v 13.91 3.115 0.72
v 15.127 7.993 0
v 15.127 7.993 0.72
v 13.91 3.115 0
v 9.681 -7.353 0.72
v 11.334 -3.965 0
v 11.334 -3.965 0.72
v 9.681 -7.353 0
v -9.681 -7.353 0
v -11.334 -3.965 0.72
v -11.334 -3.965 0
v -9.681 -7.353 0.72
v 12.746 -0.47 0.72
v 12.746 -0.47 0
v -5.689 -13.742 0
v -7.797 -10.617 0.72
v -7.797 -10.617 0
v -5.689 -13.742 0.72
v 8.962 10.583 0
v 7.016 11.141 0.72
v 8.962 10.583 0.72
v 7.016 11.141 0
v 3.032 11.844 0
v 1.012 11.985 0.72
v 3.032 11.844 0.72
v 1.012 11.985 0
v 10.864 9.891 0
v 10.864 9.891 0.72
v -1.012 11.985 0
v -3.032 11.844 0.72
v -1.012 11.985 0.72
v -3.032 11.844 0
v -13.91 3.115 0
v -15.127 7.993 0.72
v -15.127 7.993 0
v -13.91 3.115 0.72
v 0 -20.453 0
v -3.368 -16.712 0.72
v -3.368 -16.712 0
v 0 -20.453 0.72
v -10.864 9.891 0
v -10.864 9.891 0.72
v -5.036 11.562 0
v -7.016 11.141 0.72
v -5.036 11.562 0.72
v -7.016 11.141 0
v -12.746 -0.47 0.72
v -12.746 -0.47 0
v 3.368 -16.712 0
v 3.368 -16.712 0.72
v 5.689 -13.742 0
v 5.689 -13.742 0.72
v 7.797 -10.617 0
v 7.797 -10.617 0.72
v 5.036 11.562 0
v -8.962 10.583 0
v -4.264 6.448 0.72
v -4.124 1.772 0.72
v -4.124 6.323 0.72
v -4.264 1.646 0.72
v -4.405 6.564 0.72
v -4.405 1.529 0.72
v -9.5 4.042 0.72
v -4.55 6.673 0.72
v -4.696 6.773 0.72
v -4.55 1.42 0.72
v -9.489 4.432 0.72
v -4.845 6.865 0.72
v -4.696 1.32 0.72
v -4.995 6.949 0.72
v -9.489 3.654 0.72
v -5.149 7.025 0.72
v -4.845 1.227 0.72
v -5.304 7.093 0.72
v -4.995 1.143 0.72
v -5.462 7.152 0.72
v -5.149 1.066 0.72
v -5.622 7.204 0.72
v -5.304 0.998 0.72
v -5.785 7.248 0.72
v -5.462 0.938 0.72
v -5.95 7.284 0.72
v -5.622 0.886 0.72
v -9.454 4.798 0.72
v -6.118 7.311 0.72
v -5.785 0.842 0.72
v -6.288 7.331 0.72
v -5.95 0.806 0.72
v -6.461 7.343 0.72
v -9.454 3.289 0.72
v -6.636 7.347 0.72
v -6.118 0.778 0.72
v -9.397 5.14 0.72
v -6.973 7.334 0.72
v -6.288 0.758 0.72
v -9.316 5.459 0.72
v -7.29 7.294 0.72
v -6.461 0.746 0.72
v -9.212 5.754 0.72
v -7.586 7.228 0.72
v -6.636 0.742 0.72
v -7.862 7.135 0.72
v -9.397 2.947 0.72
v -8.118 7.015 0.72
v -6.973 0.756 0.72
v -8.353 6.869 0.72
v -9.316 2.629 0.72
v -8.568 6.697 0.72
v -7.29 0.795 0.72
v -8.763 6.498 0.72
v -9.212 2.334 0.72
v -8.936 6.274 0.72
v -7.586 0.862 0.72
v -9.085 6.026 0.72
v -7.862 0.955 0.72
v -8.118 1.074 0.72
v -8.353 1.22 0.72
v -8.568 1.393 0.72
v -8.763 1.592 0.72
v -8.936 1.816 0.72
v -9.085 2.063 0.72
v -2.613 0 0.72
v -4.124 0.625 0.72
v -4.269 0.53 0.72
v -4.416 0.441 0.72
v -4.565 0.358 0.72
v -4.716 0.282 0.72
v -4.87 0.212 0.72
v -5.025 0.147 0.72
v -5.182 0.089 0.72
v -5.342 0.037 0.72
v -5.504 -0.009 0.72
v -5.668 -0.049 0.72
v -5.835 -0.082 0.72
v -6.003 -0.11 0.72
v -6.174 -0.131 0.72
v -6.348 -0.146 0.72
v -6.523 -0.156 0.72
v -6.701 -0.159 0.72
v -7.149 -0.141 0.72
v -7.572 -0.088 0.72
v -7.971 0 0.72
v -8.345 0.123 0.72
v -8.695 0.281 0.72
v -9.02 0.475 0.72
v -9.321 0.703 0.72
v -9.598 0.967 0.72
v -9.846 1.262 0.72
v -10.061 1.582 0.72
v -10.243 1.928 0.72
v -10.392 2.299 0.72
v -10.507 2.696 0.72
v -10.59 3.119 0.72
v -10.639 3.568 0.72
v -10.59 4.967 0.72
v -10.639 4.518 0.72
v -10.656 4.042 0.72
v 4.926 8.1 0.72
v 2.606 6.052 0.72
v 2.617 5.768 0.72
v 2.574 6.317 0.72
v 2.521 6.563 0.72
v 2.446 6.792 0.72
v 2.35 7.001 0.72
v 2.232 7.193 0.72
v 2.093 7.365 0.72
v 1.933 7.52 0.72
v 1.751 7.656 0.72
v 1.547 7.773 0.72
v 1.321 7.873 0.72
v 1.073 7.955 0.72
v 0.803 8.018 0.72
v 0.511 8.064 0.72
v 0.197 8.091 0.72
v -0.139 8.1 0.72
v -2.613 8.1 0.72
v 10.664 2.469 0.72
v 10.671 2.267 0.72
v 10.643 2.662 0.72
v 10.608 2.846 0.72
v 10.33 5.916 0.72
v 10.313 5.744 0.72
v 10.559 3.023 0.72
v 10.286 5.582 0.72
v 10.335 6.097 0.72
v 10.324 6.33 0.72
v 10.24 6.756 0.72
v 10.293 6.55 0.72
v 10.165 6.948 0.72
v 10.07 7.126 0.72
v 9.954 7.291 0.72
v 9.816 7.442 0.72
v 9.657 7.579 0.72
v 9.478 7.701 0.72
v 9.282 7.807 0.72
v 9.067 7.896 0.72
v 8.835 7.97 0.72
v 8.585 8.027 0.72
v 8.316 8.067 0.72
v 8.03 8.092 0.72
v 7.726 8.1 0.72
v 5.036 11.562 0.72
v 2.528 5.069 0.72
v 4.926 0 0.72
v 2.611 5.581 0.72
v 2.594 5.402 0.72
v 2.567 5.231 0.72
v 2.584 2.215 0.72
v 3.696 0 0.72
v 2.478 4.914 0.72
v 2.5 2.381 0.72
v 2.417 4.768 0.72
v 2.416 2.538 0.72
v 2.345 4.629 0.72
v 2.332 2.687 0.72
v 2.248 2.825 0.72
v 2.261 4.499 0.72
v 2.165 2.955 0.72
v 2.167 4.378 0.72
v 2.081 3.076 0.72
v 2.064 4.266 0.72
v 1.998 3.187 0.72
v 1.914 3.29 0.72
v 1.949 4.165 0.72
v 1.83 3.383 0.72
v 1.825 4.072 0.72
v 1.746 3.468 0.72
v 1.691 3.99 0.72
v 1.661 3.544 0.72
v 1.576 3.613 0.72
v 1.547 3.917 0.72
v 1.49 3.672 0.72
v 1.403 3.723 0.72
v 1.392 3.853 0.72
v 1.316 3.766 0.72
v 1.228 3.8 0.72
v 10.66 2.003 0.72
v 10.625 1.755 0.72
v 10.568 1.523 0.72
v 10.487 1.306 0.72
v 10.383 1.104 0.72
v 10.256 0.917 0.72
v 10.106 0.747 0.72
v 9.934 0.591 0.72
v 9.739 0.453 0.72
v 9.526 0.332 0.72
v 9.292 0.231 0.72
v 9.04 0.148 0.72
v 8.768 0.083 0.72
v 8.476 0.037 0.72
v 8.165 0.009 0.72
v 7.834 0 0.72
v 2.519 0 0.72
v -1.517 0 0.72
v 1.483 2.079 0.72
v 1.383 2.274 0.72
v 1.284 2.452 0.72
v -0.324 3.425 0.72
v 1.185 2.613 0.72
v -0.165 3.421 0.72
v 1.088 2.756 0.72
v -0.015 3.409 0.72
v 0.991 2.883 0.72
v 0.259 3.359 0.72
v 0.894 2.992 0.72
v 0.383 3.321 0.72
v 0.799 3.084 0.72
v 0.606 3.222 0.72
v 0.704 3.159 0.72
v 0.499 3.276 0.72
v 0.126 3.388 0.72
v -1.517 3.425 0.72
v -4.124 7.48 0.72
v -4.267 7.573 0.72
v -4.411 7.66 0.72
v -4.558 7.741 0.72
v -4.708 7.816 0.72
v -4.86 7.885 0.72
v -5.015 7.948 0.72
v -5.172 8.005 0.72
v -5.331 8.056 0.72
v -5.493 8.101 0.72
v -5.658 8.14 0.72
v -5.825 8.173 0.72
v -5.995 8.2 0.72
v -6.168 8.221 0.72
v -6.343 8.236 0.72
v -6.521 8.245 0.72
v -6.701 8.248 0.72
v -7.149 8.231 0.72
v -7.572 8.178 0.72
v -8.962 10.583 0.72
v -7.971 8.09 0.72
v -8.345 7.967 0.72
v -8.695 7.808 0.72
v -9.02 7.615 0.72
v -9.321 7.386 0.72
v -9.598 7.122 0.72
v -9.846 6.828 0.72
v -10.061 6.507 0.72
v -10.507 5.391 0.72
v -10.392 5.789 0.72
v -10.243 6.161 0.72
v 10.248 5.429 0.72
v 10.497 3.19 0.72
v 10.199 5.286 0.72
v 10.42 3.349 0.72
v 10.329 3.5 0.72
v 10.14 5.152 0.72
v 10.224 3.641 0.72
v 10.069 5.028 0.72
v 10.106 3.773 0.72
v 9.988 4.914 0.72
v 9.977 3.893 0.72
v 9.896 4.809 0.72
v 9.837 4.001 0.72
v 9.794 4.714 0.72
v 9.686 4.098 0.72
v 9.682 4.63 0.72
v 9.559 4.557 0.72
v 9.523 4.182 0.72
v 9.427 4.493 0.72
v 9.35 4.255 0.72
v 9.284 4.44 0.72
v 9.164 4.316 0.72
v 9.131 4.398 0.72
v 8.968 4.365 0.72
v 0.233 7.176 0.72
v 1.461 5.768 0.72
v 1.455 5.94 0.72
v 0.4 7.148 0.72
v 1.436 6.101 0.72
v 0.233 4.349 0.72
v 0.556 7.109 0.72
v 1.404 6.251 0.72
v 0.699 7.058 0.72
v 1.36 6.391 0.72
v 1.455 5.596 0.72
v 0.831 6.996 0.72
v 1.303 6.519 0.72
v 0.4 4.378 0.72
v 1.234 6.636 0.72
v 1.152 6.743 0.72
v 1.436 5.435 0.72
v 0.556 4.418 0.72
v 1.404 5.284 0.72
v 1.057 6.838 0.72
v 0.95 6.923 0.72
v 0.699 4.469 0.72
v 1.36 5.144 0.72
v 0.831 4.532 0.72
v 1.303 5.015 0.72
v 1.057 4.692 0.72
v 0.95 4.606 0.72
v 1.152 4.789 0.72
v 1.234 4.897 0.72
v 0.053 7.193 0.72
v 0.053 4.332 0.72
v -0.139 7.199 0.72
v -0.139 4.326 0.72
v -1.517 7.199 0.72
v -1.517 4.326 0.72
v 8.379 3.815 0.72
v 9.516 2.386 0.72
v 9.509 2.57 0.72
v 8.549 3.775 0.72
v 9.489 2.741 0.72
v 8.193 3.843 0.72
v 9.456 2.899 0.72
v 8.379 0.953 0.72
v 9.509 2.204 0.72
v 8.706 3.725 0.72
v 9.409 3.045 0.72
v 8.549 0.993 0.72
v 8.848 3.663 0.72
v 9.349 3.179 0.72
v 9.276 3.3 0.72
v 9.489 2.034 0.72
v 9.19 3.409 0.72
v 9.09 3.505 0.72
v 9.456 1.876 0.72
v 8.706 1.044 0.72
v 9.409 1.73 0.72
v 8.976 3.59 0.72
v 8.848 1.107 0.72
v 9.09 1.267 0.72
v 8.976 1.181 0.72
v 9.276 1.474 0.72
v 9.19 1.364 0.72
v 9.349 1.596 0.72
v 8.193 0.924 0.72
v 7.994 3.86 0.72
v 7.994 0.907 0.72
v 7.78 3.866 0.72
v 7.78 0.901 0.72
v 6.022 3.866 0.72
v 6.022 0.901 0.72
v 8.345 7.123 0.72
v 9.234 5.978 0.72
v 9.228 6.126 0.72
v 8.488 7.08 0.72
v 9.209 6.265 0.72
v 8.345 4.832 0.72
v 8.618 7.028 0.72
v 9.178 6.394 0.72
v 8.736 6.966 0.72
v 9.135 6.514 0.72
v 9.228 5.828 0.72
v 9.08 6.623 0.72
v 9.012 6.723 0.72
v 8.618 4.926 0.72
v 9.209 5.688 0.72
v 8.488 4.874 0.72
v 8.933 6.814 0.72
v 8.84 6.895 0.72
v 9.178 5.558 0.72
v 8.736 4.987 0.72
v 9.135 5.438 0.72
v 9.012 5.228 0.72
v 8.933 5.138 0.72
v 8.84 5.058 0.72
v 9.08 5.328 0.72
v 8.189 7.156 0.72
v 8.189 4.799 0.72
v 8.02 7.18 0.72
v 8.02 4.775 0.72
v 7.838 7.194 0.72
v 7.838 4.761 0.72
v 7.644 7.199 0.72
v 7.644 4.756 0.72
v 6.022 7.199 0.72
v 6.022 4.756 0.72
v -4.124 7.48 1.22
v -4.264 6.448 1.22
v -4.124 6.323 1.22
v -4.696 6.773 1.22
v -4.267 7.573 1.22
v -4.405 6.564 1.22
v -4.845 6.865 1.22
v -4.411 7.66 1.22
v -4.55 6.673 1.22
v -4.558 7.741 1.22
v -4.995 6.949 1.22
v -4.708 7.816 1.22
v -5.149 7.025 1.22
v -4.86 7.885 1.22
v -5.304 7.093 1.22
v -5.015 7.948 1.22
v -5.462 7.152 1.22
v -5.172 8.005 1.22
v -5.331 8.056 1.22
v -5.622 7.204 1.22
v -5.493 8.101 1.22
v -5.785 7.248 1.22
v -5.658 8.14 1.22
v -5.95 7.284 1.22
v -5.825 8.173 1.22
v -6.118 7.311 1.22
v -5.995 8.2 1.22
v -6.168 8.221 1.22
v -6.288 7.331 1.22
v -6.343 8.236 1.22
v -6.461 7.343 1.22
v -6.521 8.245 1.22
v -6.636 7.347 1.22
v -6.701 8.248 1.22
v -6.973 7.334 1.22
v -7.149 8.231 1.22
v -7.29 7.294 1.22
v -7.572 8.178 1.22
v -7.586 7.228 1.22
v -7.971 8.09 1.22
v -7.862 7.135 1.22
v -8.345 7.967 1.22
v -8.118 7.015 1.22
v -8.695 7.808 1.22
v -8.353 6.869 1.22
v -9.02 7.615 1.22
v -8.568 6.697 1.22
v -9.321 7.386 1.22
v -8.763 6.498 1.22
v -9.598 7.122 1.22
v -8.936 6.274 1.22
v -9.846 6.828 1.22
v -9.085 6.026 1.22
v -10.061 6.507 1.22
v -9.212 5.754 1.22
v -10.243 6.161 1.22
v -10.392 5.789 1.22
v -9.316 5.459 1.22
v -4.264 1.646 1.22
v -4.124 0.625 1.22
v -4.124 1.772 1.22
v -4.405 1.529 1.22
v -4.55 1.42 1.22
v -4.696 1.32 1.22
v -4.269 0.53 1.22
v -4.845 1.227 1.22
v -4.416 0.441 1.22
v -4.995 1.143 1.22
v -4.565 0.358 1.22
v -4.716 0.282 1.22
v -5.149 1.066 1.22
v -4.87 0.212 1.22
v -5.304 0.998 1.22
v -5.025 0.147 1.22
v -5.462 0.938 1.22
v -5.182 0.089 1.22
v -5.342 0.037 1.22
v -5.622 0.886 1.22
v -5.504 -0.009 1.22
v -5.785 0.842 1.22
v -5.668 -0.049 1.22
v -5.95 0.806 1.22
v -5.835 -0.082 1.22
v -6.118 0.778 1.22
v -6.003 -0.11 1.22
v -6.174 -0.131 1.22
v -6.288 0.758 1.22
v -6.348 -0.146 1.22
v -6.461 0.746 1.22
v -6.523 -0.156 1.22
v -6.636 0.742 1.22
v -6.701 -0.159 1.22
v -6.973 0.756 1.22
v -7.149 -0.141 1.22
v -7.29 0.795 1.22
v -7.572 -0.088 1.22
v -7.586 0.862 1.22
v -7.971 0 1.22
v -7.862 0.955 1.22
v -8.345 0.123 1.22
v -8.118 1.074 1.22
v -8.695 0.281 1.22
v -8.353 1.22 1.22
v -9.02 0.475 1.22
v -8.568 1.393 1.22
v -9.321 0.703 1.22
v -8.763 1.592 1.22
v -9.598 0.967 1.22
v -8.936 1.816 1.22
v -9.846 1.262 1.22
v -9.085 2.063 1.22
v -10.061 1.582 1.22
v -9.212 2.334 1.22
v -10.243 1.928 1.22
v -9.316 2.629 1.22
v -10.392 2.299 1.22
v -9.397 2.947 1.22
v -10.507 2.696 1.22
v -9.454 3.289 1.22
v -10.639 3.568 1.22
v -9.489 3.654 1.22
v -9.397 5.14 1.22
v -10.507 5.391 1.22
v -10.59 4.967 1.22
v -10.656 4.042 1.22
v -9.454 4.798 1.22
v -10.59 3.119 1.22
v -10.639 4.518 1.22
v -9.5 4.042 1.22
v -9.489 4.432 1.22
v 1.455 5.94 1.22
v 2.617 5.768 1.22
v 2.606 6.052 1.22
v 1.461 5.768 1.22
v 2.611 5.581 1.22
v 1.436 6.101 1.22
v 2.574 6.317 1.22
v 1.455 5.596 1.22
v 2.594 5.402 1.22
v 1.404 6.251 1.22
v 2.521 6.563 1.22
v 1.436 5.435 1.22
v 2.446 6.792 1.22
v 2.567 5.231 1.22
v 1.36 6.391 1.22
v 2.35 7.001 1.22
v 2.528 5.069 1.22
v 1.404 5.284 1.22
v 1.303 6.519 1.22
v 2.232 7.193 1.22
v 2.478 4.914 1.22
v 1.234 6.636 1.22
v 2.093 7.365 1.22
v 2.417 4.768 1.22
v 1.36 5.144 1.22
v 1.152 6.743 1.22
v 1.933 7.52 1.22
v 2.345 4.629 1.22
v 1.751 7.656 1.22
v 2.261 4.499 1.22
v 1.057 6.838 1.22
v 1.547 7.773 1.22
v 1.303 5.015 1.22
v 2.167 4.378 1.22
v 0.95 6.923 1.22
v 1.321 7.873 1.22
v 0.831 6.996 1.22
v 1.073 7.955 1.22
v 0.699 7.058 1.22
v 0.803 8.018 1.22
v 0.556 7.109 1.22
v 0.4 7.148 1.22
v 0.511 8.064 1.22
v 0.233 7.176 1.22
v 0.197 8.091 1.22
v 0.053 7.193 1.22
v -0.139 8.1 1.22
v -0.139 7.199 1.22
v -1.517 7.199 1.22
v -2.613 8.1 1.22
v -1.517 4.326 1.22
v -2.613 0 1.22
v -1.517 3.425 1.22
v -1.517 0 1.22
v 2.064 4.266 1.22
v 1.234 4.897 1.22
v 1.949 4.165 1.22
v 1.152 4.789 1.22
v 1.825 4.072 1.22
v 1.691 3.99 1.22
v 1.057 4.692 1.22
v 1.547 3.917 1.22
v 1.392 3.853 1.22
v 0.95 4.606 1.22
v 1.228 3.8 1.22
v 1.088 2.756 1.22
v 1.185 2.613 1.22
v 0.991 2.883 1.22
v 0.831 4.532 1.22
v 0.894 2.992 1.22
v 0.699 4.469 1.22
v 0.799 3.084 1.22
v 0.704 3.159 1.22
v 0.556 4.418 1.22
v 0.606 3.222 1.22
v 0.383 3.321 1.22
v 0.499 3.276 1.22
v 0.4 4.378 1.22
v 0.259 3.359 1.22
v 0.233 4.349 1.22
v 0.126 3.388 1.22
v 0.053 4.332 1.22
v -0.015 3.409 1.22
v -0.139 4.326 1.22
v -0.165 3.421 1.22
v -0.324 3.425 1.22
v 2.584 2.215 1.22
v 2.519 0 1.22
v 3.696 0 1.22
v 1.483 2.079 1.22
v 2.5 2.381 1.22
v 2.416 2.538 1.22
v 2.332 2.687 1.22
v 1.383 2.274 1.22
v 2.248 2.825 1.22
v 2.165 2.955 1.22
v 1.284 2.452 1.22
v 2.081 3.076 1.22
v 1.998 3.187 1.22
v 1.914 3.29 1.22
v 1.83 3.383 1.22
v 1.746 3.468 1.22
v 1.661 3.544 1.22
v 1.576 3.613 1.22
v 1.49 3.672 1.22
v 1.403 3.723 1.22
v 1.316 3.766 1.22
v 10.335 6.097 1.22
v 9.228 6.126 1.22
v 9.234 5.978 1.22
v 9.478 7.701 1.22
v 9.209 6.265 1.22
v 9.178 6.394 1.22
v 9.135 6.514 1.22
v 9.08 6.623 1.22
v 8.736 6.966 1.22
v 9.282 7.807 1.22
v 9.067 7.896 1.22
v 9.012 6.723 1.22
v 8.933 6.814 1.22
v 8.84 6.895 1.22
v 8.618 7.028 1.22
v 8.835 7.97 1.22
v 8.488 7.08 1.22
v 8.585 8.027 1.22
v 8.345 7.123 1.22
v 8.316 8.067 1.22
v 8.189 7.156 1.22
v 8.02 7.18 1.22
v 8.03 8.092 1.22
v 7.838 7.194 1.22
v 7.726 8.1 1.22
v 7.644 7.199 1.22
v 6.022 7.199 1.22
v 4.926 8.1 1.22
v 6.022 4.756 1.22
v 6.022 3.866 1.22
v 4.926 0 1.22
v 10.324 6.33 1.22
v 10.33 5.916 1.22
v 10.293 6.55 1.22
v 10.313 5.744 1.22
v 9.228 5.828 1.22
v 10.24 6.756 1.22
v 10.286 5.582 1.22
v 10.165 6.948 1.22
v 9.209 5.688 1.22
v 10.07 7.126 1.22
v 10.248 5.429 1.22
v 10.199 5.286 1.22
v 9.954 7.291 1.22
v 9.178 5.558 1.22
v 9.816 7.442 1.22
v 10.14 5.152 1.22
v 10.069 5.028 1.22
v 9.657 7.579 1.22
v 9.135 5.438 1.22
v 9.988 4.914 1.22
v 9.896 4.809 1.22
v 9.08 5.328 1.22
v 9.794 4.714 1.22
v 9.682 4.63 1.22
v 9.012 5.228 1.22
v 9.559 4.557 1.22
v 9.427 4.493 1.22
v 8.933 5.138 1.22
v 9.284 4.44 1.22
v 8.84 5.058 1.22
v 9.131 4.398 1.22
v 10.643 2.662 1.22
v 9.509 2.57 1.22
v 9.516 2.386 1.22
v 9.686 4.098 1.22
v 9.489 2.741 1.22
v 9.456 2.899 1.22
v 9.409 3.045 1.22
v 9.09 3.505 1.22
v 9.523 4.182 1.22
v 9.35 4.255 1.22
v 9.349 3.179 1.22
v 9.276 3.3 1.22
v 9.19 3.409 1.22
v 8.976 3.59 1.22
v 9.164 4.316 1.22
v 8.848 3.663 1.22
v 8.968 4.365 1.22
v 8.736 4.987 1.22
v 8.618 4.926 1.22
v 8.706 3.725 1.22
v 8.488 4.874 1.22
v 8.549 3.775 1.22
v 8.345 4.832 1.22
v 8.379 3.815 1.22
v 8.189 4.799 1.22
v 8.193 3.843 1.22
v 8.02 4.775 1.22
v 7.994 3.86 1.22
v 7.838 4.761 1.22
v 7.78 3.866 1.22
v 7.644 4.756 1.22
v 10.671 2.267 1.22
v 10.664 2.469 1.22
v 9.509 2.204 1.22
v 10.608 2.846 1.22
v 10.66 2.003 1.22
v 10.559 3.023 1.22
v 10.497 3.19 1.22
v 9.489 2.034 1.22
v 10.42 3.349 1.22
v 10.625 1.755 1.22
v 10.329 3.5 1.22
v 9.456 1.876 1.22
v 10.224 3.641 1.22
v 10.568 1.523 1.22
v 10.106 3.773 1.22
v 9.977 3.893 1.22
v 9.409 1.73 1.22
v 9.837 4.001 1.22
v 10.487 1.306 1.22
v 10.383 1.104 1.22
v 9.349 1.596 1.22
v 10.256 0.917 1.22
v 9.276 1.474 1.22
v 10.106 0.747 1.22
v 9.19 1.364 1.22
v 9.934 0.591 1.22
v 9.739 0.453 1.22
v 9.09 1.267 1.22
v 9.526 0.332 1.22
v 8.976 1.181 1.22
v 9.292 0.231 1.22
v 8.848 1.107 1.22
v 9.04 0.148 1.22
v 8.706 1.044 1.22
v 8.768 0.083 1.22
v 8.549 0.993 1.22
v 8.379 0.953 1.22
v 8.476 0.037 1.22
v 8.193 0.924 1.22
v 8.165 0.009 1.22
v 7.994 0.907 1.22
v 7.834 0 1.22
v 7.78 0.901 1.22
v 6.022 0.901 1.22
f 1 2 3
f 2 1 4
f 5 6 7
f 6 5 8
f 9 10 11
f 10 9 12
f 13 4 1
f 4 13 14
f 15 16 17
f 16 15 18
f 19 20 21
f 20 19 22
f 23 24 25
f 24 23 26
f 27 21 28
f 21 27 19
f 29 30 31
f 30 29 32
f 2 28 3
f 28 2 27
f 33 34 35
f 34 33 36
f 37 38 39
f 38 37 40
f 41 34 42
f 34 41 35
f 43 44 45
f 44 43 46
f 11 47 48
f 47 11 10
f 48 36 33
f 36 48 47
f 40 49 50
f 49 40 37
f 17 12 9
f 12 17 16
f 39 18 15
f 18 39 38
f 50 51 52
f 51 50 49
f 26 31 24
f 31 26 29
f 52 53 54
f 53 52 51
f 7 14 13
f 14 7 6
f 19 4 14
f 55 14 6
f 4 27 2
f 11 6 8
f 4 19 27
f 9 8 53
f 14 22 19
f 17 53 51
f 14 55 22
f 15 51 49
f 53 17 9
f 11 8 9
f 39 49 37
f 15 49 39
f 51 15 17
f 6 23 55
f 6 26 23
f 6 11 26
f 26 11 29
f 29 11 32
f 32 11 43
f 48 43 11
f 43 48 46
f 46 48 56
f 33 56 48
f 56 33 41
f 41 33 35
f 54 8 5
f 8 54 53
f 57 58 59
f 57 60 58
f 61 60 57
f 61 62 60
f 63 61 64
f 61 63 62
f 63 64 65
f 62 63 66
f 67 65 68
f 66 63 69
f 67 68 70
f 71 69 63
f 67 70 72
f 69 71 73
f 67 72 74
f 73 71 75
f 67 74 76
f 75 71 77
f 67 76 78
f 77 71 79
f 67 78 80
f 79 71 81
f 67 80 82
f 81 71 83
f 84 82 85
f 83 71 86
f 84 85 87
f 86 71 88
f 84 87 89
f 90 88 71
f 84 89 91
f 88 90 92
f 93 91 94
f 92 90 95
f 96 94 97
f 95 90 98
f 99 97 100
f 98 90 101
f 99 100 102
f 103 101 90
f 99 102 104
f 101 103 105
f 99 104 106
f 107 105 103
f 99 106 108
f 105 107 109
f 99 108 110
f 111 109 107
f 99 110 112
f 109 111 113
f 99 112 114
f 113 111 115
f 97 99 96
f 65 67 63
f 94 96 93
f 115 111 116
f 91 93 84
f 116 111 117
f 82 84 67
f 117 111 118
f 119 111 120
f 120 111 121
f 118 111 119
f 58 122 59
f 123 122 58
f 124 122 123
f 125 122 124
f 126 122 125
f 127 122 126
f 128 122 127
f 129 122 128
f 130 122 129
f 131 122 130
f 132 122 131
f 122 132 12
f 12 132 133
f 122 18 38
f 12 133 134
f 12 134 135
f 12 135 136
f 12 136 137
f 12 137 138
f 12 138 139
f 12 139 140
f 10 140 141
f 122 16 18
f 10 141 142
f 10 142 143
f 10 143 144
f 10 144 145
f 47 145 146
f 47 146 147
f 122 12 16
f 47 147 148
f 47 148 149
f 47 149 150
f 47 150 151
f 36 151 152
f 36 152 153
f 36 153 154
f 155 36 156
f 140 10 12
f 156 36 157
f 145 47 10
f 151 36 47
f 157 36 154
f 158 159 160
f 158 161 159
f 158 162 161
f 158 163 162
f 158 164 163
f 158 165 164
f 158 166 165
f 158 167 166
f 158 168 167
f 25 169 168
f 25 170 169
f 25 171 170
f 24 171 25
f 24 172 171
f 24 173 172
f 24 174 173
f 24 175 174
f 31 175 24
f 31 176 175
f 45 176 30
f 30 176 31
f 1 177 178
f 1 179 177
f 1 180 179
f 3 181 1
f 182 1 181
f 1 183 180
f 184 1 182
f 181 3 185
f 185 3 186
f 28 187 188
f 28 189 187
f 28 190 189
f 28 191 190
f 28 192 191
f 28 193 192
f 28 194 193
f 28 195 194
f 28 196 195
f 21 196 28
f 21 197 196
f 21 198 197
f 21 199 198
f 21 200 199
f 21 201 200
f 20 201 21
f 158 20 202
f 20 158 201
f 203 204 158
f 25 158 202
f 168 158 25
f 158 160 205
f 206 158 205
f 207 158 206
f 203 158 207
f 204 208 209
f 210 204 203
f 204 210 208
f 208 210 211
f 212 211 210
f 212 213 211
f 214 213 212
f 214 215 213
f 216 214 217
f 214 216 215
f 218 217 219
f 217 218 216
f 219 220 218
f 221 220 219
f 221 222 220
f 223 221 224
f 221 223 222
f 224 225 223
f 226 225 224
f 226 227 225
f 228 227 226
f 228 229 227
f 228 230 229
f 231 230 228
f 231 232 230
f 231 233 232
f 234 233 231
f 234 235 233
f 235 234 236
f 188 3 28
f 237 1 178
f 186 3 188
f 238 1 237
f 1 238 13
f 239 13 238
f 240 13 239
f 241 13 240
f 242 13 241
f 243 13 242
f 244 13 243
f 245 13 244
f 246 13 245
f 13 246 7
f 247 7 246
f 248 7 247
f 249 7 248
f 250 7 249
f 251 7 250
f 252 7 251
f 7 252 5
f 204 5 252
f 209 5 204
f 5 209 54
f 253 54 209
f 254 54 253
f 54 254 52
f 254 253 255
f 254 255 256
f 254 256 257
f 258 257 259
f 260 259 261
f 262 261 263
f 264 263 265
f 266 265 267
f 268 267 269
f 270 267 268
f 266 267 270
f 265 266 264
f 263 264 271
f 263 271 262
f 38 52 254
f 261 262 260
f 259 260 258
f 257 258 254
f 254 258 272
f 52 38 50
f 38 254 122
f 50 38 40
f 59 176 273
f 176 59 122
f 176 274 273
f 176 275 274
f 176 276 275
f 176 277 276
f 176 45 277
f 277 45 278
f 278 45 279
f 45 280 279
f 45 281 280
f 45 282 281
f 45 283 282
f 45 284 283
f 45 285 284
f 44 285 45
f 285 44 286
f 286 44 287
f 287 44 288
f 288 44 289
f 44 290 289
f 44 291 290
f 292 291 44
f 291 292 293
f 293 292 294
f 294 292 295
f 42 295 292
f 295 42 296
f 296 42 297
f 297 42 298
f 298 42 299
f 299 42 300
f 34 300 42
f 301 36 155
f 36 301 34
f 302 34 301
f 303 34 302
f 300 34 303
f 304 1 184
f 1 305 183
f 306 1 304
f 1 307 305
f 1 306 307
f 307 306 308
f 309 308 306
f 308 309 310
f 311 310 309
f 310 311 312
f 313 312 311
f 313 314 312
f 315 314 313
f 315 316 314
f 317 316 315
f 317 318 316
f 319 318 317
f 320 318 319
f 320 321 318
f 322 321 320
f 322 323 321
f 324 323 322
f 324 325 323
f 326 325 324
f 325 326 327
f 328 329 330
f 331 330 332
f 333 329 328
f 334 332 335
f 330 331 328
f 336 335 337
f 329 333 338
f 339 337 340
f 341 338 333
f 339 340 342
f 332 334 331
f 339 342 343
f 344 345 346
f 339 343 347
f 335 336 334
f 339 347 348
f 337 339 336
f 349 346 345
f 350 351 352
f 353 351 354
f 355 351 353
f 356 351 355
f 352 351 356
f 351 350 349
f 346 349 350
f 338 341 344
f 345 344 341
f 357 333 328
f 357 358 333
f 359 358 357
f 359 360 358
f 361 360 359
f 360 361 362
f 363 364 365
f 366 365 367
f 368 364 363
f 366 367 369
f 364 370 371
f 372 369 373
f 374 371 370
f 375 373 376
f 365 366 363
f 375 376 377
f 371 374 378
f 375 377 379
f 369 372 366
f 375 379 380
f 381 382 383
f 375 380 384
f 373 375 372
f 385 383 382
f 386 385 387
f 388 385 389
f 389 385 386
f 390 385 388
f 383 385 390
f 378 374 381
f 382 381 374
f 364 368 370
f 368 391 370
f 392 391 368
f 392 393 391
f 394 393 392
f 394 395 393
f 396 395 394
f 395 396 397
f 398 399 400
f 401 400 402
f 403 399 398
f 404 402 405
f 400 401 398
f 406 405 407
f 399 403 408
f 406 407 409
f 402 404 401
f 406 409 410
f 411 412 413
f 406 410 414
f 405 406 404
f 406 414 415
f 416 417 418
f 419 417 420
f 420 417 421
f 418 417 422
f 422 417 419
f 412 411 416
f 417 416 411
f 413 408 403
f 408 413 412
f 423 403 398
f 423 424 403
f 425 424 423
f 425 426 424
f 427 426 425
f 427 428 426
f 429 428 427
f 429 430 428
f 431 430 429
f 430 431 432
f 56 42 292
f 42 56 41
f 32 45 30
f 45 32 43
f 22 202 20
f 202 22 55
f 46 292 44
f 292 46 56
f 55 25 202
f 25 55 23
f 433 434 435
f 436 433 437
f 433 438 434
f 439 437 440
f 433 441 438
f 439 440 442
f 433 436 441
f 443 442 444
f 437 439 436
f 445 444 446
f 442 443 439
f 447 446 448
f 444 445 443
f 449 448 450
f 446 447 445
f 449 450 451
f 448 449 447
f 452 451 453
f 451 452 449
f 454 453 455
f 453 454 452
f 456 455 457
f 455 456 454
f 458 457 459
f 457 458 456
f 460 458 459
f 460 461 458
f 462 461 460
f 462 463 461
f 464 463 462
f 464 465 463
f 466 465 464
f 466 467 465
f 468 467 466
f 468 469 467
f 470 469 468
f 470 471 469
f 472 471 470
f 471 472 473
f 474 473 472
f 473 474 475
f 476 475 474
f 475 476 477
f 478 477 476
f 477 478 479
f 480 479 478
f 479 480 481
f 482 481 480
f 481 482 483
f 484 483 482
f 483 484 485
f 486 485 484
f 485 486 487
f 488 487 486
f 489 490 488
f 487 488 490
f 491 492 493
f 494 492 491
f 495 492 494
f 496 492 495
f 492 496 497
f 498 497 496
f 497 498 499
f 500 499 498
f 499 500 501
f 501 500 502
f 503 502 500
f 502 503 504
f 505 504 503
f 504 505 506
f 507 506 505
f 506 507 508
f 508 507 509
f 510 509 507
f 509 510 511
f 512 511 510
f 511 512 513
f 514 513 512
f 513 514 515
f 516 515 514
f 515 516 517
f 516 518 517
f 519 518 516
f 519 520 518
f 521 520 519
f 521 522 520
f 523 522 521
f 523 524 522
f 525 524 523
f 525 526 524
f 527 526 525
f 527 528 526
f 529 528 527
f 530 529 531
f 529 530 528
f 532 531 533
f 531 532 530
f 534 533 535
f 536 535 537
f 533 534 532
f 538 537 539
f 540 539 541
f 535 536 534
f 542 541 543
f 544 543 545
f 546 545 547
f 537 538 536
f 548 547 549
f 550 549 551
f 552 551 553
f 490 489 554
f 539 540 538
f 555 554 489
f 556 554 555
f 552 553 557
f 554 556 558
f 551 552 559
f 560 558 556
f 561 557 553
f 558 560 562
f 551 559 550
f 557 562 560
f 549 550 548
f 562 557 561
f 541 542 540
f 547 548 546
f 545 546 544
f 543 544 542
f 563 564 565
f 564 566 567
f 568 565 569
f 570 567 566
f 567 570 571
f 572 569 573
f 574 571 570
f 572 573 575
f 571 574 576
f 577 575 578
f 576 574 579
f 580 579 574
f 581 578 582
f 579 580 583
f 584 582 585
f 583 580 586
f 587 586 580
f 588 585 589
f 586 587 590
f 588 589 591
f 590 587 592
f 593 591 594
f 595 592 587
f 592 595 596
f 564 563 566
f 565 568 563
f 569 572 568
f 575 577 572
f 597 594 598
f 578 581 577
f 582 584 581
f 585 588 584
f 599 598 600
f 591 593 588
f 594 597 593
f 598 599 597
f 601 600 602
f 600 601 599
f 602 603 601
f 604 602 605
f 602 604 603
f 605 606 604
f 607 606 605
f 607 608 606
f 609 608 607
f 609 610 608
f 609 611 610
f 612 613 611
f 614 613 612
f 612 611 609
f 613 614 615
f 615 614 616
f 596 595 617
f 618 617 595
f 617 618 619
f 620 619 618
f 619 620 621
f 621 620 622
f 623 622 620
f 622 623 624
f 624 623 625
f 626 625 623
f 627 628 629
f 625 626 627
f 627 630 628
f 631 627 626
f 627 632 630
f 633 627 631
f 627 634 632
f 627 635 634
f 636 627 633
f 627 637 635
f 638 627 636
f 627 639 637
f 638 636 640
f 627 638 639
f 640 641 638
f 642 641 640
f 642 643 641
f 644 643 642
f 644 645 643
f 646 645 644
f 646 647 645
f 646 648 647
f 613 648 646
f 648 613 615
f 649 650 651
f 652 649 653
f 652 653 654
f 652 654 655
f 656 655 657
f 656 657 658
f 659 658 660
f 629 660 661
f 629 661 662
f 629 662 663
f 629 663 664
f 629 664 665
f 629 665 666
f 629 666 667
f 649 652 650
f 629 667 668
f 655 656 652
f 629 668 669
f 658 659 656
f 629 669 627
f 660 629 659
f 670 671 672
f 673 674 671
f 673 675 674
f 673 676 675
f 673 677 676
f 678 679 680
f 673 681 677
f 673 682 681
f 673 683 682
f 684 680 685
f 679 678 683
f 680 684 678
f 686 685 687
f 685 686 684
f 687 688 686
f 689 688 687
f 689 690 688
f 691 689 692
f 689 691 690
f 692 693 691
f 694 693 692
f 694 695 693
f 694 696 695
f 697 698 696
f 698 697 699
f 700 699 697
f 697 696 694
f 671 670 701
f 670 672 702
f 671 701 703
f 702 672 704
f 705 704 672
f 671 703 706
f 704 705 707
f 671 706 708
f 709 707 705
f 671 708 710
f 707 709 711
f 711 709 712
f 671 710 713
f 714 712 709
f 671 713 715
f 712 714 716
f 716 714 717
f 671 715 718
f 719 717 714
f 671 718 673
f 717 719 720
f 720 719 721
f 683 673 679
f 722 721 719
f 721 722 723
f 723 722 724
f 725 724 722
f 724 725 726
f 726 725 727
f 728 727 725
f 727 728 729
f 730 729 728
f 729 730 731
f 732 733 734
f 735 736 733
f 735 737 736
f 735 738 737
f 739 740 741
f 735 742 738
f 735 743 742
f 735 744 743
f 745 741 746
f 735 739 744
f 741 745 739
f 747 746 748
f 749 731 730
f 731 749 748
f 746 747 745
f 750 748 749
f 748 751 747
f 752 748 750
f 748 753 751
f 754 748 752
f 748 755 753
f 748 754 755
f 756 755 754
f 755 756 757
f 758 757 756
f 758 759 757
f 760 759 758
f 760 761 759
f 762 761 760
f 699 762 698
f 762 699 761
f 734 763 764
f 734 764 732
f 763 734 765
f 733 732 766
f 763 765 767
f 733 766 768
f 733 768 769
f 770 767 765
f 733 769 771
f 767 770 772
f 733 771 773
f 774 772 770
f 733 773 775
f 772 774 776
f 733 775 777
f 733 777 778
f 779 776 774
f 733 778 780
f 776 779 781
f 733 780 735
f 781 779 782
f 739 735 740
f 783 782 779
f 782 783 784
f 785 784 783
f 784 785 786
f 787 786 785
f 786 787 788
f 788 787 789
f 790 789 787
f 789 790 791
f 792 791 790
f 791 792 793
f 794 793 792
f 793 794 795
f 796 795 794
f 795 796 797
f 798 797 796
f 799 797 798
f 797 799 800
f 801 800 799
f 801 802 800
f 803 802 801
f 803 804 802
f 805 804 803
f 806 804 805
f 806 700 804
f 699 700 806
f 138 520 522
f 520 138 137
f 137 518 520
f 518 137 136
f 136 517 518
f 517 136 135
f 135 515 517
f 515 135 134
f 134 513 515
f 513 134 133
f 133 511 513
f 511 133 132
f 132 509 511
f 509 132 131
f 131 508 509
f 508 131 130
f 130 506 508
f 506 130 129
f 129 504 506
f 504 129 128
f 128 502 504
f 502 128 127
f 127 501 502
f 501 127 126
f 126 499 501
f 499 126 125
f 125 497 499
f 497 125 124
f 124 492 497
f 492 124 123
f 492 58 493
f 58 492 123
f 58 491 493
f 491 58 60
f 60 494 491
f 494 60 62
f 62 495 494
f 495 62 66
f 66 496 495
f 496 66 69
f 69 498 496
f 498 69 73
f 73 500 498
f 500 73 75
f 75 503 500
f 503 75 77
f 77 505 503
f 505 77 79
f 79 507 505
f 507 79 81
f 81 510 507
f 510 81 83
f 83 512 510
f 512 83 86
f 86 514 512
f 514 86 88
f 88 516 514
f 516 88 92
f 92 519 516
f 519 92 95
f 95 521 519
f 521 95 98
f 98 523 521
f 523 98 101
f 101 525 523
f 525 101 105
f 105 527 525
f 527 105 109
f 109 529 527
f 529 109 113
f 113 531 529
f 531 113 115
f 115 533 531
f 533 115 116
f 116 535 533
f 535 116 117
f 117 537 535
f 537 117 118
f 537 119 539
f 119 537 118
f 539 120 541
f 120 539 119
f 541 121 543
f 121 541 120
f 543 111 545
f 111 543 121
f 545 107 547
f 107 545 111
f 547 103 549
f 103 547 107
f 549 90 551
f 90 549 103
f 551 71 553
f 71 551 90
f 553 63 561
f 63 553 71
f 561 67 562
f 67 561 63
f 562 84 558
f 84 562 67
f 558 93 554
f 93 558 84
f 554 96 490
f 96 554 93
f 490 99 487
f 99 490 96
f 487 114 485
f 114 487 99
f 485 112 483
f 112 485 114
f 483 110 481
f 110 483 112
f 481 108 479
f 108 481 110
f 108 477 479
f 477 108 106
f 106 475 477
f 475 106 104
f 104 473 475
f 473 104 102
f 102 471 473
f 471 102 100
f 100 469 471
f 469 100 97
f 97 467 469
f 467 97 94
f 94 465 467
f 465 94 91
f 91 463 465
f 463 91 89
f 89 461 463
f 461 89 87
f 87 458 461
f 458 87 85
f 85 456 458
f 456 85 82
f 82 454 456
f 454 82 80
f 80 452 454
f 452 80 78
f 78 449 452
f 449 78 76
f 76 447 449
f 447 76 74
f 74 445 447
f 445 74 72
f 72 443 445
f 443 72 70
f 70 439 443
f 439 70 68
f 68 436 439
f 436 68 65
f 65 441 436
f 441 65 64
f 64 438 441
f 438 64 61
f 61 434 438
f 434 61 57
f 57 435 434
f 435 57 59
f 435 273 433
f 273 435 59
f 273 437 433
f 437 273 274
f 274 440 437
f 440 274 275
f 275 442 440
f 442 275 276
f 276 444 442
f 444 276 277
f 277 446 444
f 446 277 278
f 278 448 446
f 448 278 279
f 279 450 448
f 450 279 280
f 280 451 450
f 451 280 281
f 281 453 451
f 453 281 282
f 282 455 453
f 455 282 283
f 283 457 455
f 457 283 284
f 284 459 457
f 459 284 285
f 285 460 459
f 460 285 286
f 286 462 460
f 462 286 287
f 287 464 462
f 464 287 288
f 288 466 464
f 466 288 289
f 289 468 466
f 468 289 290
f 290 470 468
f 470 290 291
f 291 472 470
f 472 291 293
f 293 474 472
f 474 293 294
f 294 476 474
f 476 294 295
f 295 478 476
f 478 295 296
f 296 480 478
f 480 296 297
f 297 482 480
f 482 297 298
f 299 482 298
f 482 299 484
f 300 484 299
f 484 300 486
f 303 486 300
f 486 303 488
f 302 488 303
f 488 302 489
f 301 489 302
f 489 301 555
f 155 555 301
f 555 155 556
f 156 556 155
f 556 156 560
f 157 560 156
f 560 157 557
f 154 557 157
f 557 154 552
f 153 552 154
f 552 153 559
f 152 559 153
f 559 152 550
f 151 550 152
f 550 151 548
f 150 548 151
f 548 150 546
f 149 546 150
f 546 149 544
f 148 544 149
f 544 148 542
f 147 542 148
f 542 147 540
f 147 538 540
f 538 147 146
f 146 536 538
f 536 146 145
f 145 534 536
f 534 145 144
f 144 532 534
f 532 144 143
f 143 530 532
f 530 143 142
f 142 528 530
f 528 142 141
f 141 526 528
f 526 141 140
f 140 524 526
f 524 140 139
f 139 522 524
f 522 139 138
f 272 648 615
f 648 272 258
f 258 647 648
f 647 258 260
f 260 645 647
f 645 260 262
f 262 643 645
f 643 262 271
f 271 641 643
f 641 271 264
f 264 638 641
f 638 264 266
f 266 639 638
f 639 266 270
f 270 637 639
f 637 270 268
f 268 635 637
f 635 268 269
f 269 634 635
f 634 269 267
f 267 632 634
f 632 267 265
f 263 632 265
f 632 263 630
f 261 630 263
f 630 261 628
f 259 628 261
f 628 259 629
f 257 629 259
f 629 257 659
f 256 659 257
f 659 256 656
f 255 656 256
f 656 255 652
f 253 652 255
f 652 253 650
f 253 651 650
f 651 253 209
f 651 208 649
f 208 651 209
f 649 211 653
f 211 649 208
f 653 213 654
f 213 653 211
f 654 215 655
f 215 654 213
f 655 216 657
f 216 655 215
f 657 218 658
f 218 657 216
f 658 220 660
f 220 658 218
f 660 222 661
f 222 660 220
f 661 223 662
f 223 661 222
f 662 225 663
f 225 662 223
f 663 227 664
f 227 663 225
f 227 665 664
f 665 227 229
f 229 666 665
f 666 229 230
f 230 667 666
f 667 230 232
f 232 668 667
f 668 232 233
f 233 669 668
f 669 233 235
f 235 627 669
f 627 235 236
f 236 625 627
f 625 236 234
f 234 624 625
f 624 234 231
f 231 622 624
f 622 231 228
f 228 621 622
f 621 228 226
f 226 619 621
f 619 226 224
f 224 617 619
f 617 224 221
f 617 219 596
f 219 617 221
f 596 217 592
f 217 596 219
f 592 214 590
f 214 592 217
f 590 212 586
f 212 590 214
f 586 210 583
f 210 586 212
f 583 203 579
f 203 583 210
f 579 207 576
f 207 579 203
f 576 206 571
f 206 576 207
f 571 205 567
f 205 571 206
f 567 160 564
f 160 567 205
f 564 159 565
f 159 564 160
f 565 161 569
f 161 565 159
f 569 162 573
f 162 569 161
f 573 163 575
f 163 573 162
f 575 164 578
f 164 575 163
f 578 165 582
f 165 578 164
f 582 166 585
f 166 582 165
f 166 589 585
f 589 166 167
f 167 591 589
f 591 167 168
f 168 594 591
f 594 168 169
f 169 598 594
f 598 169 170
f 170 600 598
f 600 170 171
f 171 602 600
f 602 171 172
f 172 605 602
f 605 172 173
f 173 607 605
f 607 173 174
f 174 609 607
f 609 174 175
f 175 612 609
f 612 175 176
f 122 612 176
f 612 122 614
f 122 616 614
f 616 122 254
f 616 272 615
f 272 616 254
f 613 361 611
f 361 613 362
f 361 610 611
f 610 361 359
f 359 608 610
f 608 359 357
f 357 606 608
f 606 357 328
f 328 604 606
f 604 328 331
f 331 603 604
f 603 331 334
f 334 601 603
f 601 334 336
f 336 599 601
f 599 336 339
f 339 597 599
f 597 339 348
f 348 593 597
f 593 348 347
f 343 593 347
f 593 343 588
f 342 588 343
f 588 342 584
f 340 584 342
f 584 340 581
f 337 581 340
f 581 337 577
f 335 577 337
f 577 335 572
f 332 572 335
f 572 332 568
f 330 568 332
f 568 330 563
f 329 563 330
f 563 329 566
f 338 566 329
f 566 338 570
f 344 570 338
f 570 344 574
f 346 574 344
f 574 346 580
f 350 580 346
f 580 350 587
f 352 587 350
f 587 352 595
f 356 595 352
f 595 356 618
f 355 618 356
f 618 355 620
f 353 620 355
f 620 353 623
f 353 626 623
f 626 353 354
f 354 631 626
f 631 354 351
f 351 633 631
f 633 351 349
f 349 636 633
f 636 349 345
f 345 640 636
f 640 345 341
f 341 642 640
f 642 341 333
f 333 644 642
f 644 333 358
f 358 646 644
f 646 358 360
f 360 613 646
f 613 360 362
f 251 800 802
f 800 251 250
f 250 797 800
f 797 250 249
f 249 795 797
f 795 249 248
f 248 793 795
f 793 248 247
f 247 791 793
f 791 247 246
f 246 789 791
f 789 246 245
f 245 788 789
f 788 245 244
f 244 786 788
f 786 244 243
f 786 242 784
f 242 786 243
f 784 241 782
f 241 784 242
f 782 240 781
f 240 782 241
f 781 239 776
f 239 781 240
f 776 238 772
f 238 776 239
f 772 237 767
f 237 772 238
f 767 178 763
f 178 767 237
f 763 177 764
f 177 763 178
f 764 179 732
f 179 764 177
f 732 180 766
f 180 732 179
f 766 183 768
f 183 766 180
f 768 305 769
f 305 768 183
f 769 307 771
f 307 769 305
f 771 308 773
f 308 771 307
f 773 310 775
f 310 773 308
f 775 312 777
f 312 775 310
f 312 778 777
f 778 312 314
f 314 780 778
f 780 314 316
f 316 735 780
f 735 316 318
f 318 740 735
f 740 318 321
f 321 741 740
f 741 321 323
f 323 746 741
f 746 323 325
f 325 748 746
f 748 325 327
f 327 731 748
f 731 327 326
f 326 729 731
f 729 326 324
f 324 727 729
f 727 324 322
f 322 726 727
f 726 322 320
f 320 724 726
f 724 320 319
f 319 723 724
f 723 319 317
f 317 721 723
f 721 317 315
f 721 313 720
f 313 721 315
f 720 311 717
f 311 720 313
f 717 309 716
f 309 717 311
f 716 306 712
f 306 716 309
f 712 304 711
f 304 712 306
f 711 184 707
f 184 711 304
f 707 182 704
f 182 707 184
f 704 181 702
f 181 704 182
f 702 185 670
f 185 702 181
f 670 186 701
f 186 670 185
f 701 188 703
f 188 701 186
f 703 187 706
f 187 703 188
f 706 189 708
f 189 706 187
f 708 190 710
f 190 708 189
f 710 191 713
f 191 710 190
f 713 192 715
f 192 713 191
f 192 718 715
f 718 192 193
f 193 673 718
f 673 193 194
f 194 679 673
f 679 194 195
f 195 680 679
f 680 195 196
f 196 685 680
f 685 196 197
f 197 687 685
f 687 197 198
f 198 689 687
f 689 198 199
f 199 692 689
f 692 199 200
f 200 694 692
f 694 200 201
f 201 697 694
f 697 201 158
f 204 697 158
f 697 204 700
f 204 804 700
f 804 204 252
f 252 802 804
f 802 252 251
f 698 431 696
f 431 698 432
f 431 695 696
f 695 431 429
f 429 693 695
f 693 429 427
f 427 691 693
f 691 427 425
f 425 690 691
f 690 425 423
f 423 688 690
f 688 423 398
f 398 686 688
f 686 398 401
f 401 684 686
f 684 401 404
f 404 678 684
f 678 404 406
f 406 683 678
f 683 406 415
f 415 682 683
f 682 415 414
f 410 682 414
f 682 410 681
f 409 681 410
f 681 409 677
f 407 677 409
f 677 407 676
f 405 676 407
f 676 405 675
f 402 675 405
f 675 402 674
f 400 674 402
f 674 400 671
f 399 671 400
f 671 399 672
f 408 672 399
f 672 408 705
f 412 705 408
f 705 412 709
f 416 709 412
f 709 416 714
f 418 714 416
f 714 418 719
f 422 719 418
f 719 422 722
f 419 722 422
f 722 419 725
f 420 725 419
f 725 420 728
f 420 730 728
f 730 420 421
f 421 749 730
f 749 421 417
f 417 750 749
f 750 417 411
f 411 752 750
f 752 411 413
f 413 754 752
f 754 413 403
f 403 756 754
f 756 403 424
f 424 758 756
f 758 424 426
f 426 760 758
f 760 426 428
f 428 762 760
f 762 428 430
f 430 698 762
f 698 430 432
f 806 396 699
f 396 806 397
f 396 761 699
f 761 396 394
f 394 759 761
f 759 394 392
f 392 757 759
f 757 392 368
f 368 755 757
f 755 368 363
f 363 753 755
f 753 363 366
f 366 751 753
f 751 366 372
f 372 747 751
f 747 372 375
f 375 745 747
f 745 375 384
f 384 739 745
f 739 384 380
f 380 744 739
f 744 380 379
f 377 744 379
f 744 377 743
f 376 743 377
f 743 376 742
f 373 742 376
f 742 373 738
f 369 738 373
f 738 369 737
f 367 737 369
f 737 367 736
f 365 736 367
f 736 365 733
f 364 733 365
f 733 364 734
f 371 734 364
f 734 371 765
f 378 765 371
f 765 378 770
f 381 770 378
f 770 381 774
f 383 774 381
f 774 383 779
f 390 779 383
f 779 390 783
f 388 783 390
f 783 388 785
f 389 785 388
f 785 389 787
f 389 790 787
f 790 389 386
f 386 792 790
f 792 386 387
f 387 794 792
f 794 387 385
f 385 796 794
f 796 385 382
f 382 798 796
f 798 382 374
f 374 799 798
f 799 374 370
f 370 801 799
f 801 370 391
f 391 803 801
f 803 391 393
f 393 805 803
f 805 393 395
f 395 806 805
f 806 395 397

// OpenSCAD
$fs=0.8; // def 1, 0.2 is high res
$fa=4;//def 12, 3 is very nice
%translate([0,0,-0.5])cube([200,200,1],center=true); //build platform

//CUSTOMIZER VARIABLES

// This section is displays the box options
// Pick Thickness 
z_thick = 0.72;	//	[1:Extra Lite, 1.5:Lite, 1.875:Medium, 2.5:Heavy, 3.75:Extra Heavy, 4.375:Extreme!]

//AdvancedGrip Technology
Grip = 0; // [1:Yes, 0:No]

//CUSTOMIZER VARIABLES END

module grip() {
	//TOP GRIP
	translate([0,0,-1.61]) {
		difference() {
			translate([0,23,2])
				intersection() {
					translate([-51,0,0]) cylinder(.2,67,66);
					translate([51,0,0]) cylinder(.2,67,66);
					translate([0,-38,0]) cylinder(.2,25,24);
				}
			translate([0,-15,0]) cylinder(3,16,25);
		}
	}
	//BOTTOM GRIP
	translate([0,-4,-1.61]) {
		difference() {
			translate([0,23,2])
				intersection() {
				translate([-51,0,0]) cylinder(.2,65,64);
				translate([51,0,0]) cylinder(.2,65,64);
				translate([0,-38,0]) cylinder(.2,23,22);
			}
			translate([0,-15,0]) cylinder(3,14,23);
		}
	}
}

module pick_shape(z_thick) {
	//error correct
	translate([0,18,0])
	linear_extrude(height = z_thick, twist = 0, slices = 3) {
	offset(delta = 4, join_type = "round") {
		intersection() {
			translate([-38,0,0]) circle(50);
			translate([38,0,0]) circle(50);
			translate([0,-35,0]) circle(25);
		}
	}
	}
}

//PickPerfect

color("darkorange") pick_shape(z_thick);
if(Grip==1){
	color("gold") grip();
}
translate([0,-0,.5])linear_extrude(height = z_thick, slices = 3) {
	 text("CRB", font = "Racing Sans One", size = 8, halign = "center");
}
